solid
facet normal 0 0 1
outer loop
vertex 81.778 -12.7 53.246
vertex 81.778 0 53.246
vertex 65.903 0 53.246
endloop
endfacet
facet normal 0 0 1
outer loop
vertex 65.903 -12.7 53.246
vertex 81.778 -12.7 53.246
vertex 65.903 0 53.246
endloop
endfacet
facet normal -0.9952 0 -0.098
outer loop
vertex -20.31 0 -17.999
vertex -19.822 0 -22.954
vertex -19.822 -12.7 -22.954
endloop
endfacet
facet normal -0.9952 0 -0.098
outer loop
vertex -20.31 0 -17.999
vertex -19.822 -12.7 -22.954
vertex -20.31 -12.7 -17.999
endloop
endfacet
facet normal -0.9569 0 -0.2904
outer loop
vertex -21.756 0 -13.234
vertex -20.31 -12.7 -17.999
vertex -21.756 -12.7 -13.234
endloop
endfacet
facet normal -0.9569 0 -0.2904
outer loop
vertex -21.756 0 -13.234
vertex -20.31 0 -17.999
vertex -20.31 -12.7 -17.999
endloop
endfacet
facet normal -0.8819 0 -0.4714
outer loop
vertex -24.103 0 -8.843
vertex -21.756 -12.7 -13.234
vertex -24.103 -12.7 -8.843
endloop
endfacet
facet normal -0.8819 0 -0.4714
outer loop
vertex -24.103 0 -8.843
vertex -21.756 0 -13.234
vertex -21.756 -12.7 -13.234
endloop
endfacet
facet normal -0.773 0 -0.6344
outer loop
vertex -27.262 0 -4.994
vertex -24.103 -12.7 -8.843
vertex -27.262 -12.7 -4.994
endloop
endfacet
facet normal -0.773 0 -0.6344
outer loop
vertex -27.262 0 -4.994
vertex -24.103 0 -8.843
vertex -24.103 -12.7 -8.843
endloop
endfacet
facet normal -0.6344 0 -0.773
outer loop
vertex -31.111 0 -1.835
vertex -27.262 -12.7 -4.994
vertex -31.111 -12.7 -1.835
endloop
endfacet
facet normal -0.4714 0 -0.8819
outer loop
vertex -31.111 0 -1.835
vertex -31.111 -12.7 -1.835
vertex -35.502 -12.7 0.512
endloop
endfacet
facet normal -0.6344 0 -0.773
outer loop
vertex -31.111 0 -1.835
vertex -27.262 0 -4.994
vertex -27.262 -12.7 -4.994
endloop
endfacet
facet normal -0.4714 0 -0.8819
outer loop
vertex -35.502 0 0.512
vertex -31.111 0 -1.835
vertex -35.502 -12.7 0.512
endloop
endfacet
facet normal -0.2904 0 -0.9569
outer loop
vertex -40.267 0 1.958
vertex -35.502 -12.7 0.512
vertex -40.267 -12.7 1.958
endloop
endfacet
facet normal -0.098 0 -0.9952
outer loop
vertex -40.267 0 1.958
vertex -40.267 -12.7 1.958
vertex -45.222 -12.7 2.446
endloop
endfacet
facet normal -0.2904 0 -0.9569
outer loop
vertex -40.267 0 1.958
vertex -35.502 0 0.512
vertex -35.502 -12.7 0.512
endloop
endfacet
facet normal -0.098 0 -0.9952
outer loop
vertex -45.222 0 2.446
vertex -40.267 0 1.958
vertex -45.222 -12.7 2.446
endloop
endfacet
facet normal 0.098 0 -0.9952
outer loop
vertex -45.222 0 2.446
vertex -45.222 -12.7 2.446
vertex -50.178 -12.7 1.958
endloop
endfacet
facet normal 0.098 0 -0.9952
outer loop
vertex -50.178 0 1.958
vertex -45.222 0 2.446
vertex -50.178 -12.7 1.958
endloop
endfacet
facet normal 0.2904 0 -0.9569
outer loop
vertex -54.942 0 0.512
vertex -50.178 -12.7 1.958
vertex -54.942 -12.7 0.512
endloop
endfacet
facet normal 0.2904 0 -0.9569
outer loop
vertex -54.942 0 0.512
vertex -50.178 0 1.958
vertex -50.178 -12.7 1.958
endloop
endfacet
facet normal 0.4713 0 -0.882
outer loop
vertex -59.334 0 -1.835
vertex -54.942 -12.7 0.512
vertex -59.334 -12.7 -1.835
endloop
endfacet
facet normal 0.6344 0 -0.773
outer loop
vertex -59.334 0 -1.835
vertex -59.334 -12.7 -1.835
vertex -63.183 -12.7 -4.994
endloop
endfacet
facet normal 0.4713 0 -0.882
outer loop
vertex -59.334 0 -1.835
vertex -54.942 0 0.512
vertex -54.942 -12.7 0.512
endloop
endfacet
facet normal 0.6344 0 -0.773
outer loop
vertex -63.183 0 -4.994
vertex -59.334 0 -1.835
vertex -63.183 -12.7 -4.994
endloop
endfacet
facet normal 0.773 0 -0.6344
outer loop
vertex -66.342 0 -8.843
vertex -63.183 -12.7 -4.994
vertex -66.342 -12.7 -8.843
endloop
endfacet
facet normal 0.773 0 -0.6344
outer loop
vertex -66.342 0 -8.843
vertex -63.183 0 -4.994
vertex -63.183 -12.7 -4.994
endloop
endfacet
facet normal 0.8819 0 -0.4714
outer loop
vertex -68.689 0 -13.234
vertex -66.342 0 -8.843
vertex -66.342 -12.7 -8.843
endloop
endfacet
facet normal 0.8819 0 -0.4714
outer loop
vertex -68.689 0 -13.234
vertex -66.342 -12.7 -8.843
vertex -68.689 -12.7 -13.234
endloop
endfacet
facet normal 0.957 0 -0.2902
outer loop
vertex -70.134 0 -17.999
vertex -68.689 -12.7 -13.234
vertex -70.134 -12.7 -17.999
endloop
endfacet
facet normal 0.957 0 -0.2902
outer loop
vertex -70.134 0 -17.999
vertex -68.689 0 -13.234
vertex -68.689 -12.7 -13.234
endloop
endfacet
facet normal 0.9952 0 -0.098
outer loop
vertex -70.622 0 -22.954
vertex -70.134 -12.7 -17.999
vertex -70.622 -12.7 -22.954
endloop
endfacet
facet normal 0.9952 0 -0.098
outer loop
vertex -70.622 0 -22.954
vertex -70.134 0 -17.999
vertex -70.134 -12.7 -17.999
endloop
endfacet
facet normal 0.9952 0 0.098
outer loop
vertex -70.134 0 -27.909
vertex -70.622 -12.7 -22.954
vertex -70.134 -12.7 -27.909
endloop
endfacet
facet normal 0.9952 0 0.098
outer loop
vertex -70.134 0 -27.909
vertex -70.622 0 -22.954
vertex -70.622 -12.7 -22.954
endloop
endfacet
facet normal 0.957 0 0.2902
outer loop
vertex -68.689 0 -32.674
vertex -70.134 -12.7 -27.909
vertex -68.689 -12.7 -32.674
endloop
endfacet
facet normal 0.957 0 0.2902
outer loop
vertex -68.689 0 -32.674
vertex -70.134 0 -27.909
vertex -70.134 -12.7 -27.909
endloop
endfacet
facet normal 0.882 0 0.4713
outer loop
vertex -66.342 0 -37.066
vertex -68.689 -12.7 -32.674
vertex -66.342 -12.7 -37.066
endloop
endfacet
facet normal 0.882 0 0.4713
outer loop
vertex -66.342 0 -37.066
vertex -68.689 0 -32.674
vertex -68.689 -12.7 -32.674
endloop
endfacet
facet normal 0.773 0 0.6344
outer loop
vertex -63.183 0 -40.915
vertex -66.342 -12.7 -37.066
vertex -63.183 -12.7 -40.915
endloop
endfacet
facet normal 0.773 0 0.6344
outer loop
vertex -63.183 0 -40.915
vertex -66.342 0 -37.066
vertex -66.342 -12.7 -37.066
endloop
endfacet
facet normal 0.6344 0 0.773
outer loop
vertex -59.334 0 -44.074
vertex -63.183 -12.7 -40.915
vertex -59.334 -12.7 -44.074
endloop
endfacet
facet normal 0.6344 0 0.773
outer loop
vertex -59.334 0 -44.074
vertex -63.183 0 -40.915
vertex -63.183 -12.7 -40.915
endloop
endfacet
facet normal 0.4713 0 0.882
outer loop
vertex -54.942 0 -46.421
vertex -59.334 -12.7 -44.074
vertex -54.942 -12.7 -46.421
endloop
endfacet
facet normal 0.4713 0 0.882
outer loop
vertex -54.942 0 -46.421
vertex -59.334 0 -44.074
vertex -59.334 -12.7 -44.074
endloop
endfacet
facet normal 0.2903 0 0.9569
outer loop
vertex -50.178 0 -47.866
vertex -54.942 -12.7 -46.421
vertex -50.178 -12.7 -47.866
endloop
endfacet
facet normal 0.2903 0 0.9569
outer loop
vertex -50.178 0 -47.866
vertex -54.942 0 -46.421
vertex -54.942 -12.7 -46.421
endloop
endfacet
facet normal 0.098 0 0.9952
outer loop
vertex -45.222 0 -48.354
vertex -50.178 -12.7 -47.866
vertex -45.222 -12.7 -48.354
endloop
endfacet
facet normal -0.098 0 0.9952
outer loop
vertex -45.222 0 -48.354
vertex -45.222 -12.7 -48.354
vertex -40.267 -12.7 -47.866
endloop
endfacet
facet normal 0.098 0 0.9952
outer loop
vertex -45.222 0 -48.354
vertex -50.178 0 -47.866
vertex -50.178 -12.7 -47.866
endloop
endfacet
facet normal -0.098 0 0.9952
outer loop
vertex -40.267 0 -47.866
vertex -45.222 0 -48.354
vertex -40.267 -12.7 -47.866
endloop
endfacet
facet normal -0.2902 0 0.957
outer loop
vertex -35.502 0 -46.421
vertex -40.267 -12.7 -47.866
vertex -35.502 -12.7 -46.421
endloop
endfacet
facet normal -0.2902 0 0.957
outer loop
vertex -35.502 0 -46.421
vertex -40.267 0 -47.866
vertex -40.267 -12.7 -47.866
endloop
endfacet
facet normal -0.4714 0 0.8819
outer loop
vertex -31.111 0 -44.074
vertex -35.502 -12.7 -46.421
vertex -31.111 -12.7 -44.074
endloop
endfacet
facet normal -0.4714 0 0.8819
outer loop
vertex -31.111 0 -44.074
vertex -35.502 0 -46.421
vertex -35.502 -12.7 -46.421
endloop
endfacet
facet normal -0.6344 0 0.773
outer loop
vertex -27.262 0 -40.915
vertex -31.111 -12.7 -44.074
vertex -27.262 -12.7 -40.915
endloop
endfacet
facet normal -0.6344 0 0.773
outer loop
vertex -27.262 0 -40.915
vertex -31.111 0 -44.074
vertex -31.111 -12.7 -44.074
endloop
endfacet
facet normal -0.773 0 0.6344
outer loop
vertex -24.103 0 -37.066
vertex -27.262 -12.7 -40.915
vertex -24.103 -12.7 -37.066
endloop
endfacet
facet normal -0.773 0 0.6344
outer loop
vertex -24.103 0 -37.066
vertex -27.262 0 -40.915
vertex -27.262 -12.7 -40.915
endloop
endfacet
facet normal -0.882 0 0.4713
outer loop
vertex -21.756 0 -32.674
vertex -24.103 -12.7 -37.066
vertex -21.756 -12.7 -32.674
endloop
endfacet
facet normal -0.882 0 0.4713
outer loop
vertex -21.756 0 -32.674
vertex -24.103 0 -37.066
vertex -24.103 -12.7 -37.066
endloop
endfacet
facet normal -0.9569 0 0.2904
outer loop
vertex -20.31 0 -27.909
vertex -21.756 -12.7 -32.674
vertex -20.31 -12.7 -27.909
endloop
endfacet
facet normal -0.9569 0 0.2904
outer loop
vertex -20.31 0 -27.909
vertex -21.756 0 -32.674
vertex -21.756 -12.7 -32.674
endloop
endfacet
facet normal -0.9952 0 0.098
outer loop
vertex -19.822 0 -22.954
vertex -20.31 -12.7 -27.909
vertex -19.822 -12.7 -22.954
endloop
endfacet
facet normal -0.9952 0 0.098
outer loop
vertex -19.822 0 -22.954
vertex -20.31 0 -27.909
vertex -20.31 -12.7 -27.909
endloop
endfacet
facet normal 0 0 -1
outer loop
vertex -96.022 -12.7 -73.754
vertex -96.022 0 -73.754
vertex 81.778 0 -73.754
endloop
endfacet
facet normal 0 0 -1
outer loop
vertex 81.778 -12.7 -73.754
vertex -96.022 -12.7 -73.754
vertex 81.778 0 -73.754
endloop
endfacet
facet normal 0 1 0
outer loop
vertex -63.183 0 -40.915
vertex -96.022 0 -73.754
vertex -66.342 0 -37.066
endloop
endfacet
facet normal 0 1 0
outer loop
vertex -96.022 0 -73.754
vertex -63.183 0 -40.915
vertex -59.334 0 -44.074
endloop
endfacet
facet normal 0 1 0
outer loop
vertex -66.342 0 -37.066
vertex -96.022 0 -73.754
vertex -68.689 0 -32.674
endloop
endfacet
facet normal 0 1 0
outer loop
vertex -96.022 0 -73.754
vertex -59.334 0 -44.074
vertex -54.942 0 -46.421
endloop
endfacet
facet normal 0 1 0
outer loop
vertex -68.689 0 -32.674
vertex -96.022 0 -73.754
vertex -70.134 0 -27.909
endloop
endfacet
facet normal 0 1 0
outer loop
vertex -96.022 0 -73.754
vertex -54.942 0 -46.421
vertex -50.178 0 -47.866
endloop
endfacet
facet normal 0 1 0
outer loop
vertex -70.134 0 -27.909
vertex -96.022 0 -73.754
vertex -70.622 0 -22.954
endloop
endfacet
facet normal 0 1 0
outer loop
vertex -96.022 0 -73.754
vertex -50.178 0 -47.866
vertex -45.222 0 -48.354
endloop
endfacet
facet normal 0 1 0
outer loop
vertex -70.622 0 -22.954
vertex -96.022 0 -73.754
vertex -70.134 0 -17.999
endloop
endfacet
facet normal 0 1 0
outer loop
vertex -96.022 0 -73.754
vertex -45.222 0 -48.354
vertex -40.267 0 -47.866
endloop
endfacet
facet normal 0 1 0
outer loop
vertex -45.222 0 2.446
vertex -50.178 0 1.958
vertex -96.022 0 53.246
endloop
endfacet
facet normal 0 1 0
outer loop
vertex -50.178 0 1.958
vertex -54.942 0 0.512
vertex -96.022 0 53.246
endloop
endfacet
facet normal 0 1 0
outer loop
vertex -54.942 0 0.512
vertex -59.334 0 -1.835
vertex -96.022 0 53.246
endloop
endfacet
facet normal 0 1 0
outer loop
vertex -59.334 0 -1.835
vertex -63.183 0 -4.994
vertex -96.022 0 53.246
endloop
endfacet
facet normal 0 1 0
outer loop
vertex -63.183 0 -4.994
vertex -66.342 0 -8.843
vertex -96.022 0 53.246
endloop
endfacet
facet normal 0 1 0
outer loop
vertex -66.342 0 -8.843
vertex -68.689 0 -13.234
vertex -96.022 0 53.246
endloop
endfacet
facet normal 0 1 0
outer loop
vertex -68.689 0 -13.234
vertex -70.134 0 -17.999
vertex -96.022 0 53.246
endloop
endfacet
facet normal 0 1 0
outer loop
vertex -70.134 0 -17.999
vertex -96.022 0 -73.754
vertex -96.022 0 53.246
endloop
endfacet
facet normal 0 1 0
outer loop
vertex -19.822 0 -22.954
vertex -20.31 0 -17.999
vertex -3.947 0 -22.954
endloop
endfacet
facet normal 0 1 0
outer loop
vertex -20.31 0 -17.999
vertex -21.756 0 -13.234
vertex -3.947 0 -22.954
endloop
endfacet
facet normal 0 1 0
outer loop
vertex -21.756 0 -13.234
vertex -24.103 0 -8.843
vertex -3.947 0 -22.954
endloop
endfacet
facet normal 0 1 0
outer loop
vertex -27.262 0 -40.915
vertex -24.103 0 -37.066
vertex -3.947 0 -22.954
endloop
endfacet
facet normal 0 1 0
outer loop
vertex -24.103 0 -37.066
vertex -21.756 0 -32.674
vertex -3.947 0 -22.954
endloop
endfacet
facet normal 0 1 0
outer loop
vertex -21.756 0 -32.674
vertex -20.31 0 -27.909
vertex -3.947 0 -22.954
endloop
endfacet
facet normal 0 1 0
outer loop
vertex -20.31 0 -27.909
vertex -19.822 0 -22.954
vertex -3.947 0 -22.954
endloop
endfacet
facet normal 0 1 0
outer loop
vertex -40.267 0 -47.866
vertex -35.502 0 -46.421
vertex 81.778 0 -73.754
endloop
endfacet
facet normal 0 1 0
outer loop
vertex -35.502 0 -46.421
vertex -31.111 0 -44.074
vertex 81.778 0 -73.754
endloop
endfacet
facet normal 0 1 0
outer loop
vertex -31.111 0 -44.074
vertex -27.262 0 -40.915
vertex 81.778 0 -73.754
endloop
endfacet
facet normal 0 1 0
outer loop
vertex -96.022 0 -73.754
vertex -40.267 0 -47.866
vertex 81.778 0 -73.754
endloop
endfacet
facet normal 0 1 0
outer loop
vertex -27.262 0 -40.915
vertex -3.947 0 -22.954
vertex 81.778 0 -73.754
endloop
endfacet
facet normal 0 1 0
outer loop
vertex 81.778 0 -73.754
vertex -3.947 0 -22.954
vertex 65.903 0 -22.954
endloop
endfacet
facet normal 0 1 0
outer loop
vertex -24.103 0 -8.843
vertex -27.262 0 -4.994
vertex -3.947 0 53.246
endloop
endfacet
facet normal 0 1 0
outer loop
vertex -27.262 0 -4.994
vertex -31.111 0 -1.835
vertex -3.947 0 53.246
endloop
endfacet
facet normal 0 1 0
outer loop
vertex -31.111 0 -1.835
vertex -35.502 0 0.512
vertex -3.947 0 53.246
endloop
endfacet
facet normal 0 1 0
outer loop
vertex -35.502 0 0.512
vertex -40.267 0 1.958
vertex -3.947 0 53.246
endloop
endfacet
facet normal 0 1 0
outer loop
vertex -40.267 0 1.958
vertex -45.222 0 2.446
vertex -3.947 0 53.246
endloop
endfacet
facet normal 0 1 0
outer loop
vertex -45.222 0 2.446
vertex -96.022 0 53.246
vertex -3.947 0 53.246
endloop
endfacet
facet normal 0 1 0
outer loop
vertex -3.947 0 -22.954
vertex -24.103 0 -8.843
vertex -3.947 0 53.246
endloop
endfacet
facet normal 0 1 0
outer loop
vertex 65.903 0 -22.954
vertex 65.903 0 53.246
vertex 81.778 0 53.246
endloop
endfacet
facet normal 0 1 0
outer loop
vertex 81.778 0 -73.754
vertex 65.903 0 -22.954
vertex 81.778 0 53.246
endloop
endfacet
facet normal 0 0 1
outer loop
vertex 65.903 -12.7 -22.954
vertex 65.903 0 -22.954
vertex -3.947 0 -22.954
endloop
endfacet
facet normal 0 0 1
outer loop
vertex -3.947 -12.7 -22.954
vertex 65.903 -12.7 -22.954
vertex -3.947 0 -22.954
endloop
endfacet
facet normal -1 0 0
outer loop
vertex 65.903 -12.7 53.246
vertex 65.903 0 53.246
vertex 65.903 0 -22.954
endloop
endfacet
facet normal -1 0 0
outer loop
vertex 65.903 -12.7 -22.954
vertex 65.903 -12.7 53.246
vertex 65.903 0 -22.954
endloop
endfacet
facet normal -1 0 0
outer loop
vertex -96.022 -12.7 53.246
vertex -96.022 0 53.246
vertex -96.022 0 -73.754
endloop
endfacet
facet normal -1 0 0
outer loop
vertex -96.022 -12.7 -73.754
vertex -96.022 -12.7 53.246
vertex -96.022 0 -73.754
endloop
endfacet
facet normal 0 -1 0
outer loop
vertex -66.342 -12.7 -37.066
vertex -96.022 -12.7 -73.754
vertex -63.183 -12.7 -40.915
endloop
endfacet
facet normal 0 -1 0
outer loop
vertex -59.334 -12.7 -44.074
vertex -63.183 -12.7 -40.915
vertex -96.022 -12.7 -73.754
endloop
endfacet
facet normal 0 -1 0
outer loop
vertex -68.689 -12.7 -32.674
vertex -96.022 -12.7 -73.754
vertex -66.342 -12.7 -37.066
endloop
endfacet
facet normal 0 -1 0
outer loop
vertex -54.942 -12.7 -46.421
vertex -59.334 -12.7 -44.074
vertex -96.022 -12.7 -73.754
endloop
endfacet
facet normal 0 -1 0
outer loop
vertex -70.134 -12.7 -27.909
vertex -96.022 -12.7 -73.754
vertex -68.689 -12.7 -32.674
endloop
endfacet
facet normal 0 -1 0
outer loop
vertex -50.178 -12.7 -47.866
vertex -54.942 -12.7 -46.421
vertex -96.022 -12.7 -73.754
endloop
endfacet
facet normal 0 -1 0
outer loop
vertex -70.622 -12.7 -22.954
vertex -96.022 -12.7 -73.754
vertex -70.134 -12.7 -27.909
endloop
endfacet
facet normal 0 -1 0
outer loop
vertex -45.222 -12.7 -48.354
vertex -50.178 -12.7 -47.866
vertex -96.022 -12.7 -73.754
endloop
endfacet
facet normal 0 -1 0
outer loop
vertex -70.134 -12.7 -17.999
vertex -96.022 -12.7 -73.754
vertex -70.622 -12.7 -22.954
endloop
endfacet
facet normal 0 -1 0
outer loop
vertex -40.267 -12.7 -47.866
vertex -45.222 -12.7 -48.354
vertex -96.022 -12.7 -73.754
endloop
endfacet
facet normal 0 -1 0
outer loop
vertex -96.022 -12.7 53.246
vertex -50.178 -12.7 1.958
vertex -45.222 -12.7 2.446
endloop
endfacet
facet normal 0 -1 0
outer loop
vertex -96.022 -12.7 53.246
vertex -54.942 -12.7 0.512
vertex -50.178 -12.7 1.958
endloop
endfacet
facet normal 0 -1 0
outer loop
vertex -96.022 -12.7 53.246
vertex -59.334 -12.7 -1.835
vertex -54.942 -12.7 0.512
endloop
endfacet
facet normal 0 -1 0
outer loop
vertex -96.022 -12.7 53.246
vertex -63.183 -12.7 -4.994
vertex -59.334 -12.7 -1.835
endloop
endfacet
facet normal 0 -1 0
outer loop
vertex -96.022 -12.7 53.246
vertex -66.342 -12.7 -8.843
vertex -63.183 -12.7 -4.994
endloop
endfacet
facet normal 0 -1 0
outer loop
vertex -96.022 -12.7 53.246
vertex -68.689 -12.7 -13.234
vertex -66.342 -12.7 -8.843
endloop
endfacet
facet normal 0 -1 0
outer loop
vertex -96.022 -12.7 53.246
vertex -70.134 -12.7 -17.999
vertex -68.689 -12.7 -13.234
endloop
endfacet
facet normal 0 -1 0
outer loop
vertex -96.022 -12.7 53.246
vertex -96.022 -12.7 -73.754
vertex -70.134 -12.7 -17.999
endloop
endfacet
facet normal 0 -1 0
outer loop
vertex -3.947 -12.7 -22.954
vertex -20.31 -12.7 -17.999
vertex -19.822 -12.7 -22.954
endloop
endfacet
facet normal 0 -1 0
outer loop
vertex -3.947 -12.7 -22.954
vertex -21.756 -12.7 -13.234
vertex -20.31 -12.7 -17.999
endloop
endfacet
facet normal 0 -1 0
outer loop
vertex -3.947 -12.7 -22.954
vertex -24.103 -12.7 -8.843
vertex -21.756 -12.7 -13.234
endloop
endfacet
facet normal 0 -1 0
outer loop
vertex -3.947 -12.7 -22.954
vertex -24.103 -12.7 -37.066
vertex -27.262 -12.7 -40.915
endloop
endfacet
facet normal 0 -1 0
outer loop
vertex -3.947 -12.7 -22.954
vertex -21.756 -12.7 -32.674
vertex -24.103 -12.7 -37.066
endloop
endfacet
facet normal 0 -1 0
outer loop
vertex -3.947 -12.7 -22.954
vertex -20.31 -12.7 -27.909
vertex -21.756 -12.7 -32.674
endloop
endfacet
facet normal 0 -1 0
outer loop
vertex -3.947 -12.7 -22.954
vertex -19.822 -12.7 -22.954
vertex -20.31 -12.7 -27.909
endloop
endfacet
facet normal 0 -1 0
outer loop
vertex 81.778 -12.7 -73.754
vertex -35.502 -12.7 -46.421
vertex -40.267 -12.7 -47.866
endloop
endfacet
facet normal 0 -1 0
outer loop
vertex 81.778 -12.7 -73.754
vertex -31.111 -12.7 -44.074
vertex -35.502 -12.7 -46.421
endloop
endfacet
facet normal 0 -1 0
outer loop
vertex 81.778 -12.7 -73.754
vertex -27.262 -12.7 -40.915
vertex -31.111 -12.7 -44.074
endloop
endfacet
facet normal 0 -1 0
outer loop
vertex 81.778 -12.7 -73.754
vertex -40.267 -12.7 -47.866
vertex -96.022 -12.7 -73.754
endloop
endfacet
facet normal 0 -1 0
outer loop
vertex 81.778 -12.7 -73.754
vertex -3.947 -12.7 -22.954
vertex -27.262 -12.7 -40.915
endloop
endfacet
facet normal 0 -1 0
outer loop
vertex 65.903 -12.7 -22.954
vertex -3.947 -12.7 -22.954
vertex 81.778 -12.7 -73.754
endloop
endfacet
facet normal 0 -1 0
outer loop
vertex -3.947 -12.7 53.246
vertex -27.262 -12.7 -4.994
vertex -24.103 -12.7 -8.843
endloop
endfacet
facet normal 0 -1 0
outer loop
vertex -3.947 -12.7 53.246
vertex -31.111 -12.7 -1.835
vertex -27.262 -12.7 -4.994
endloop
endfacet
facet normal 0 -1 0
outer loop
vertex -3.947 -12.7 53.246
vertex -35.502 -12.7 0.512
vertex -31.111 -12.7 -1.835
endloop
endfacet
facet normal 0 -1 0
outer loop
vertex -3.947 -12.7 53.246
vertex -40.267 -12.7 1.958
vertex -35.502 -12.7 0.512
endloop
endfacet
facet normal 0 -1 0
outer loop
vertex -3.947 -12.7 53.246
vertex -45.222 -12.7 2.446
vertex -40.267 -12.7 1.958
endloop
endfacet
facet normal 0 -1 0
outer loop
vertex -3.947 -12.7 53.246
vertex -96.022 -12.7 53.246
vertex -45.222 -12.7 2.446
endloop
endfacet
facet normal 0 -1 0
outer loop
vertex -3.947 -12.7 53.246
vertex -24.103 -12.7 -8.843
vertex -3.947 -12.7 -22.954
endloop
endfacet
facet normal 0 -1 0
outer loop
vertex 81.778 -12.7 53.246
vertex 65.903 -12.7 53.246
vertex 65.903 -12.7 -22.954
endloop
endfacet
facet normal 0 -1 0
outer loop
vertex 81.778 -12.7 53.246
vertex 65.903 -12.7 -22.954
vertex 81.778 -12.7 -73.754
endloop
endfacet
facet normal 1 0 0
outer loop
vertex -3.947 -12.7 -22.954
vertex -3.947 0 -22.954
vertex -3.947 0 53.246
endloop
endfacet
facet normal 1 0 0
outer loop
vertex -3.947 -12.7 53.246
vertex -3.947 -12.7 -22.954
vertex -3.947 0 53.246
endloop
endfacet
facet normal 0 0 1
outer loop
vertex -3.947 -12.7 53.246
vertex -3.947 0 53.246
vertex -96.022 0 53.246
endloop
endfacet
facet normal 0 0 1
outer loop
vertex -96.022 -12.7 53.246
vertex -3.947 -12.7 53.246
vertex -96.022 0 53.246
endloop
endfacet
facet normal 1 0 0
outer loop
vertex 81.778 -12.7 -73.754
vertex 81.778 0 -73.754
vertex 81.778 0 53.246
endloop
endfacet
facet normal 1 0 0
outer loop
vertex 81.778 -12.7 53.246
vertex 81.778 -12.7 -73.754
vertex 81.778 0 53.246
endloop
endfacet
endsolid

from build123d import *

# Parameters (mm, degrees)
F0_R     = 25.4
F1_DEPTH = 12.7


# Not quite as in the source:
# - a length typed as a fraction of an inch, garbled in the dataset ("3 / 203.2 mm" for 3/8 in), is restored


with BuildPart() as f1:
    # F0 (on Front) → F1 (new body)
    with BuildSketch(Plane.XZ):
        Polygon((-3.9472851508, 53.245825498), (-96.0222851508, 53.245825498), (-96.0222851508, -73.754174502), (81.7777148492, -73.754174502), (81.7777148492, 53.245825498), (65.9027148492, 53.245825498), (65.9027148492, -22.954174502), (-3.9472851508, -22.954174502), align=None)
        with Locations((-45.2222851508, -22.954174502)):
            Circle(F0_R, mode=Mode.SUBTRACT)
    extrude(amount=F1_DEPTH)


solid = f1.part
